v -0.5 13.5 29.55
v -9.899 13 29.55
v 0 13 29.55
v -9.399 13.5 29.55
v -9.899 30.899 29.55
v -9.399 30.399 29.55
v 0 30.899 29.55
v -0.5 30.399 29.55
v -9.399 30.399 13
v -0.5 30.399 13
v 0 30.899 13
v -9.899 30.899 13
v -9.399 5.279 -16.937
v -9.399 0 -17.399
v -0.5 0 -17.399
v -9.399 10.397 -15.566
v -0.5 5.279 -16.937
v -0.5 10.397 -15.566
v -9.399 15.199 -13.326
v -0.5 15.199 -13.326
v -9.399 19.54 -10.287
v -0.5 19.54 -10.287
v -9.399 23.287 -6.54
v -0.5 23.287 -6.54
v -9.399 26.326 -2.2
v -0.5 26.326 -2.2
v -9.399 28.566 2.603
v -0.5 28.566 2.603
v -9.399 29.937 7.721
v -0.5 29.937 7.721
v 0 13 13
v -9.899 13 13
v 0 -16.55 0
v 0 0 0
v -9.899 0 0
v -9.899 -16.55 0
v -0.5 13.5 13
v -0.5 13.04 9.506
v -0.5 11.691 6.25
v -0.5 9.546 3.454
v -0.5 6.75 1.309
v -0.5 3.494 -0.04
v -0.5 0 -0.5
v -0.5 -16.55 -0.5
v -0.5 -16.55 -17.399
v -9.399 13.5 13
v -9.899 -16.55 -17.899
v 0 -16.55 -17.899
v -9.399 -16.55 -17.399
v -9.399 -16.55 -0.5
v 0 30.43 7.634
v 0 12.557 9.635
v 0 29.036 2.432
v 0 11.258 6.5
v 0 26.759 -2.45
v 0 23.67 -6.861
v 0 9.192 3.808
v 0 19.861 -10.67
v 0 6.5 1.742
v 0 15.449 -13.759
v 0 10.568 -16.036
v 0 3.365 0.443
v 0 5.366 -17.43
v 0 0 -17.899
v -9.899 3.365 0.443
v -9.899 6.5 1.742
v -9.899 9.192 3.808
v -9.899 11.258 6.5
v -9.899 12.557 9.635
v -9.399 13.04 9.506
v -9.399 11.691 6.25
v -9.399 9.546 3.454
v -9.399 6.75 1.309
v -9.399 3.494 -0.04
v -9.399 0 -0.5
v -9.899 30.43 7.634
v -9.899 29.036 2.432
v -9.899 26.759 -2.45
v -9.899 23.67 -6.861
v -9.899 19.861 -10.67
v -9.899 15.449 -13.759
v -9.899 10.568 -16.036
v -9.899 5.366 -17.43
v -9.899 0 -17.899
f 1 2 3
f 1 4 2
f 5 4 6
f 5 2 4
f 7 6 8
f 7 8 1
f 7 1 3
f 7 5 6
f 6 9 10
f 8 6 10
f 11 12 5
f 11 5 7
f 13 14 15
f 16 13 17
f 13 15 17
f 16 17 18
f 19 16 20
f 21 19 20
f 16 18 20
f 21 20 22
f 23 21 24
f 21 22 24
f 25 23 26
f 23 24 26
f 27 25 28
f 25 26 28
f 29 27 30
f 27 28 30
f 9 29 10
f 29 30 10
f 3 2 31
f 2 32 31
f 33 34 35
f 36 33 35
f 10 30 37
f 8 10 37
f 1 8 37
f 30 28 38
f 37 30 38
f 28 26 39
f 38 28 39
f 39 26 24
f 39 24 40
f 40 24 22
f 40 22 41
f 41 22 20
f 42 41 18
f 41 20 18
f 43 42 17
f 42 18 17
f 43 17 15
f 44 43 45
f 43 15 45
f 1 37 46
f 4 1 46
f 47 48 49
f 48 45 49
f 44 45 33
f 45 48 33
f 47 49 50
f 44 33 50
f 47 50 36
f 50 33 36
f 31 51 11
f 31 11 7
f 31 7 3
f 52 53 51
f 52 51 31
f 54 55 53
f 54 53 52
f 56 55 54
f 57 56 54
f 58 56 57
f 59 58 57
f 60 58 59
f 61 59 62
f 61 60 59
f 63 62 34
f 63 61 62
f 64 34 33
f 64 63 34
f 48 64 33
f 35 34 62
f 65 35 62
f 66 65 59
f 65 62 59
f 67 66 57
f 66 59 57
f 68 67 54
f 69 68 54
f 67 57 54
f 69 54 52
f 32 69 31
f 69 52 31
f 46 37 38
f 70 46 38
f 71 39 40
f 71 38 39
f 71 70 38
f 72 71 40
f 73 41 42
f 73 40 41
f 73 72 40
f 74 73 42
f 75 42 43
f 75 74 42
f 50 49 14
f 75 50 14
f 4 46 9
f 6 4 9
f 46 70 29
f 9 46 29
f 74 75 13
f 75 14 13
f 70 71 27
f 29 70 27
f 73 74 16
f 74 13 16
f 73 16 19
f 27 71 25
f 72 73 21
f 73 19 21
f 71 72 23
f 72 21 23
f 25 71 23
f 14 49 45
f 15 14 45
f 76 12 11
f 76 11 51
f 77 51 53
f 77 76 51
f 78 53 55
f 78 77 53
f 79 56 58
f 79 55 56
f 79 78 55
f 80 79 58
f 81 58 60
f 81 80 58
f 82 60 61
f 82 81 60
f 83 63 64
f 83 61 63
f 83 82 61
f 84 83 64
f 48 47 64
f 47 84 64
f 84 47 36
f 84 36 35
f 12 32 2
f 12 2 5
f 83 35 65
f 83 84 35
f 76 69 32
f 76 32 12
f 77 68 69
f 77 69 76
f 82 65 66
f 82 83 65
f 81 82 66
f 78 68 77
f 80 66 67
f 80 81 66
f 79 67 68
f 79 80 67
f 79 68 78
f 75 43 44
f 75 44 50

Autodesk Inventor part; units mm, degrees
ref_plane "YZ Plane" through (0, 0, 0) normal (1, 0, 0) x (0, 1, 0)
ref_plane "XZ Plane" through (0, 0, 0) normal (0, 1, 0) x (-1, 0, 0)
ref_plane "XY Plane" through (0, 0, 0) normal (0, 0, 1) x (1, 0, 0)
sketch "Sketch1" plane through (0, 0, 0) normal (0, 1, 0) x (-1, 0, 0)
  line L0 (0, 0) -> (9.899, 0)
  line L1 (9.899, 0) -> (9.899, -17.899)
  line L2 (9.899, -17.899) -> (0, -17.899)
  line L3 (0, -17.899) -> (0, 0)
  line L4 (0.5, -0.5) -> (9.399, -0.5)
  line L5 (9.399, -0.5) -> (9.399, -17.399)
  line L6 (9.399, -17.399) -> (0.5, -17.399)
  line L7 (0.5, -17.399) -> (0.5, -0.5)
  dimension "d0" = 9.899
  dimension "d1" = 17.899
  dimension "d2" = 16.899
  dimension "d3" = 8.899
  dimension "d4" = 0.5
  dimension "d5" = 0.5
sketch "Sketch3" plane through (0, 0, 0) normal (1, 0, 0) x (0, 1, 0)
  arc A0 (0, 0) -> (13, 13) centre (0, 13) ccw
  line L0 (0, 13) -> (13, 13) construction
  line L1 (0, 13) -> (0, 0) construction
  dimension "d6" = 90
  dimension "d7" = 13
sweep "Sweep1" add profiles "Sketch1" path "Sketch3"
extrude "Extrusion1" add sketch "Sketch1" against normal blind 16.55
ref_plane "Work Plane1" through (-9.899, 13, 13) normal (0, 0, 1) x (1, 0, 0)
sketch "Sketch4" plane through (-9.899, 13, 13) normal (0, 0, 1) x (1, 0, 0)
  line L0 (0, 0) -> (9.899, 0)
  line L1 (0, 0) -> (0, 17.899)
  line L2 (0, 17.899) -> (9.899, 17.899)
  line L3 (9.899, 17.899) -> (9.899, 0)
  line L4 (0.5, 17.399) -> (9.399, 17.399)
  line L5 (9.399, 17.399) -> (9.399, 0.5)
  line L6 (9.399, 0.5) -> (0.5, 0.5)
  line L7 (9.399, 0.5) -> (0.5, 0.5) projected
  line L8 (0.5, 0.5) -> (0.5, 17.399)
extrude "Extrusion2" add sketch "Sketch4" along normal blind 16.55
properties part number "curved waveguide"
